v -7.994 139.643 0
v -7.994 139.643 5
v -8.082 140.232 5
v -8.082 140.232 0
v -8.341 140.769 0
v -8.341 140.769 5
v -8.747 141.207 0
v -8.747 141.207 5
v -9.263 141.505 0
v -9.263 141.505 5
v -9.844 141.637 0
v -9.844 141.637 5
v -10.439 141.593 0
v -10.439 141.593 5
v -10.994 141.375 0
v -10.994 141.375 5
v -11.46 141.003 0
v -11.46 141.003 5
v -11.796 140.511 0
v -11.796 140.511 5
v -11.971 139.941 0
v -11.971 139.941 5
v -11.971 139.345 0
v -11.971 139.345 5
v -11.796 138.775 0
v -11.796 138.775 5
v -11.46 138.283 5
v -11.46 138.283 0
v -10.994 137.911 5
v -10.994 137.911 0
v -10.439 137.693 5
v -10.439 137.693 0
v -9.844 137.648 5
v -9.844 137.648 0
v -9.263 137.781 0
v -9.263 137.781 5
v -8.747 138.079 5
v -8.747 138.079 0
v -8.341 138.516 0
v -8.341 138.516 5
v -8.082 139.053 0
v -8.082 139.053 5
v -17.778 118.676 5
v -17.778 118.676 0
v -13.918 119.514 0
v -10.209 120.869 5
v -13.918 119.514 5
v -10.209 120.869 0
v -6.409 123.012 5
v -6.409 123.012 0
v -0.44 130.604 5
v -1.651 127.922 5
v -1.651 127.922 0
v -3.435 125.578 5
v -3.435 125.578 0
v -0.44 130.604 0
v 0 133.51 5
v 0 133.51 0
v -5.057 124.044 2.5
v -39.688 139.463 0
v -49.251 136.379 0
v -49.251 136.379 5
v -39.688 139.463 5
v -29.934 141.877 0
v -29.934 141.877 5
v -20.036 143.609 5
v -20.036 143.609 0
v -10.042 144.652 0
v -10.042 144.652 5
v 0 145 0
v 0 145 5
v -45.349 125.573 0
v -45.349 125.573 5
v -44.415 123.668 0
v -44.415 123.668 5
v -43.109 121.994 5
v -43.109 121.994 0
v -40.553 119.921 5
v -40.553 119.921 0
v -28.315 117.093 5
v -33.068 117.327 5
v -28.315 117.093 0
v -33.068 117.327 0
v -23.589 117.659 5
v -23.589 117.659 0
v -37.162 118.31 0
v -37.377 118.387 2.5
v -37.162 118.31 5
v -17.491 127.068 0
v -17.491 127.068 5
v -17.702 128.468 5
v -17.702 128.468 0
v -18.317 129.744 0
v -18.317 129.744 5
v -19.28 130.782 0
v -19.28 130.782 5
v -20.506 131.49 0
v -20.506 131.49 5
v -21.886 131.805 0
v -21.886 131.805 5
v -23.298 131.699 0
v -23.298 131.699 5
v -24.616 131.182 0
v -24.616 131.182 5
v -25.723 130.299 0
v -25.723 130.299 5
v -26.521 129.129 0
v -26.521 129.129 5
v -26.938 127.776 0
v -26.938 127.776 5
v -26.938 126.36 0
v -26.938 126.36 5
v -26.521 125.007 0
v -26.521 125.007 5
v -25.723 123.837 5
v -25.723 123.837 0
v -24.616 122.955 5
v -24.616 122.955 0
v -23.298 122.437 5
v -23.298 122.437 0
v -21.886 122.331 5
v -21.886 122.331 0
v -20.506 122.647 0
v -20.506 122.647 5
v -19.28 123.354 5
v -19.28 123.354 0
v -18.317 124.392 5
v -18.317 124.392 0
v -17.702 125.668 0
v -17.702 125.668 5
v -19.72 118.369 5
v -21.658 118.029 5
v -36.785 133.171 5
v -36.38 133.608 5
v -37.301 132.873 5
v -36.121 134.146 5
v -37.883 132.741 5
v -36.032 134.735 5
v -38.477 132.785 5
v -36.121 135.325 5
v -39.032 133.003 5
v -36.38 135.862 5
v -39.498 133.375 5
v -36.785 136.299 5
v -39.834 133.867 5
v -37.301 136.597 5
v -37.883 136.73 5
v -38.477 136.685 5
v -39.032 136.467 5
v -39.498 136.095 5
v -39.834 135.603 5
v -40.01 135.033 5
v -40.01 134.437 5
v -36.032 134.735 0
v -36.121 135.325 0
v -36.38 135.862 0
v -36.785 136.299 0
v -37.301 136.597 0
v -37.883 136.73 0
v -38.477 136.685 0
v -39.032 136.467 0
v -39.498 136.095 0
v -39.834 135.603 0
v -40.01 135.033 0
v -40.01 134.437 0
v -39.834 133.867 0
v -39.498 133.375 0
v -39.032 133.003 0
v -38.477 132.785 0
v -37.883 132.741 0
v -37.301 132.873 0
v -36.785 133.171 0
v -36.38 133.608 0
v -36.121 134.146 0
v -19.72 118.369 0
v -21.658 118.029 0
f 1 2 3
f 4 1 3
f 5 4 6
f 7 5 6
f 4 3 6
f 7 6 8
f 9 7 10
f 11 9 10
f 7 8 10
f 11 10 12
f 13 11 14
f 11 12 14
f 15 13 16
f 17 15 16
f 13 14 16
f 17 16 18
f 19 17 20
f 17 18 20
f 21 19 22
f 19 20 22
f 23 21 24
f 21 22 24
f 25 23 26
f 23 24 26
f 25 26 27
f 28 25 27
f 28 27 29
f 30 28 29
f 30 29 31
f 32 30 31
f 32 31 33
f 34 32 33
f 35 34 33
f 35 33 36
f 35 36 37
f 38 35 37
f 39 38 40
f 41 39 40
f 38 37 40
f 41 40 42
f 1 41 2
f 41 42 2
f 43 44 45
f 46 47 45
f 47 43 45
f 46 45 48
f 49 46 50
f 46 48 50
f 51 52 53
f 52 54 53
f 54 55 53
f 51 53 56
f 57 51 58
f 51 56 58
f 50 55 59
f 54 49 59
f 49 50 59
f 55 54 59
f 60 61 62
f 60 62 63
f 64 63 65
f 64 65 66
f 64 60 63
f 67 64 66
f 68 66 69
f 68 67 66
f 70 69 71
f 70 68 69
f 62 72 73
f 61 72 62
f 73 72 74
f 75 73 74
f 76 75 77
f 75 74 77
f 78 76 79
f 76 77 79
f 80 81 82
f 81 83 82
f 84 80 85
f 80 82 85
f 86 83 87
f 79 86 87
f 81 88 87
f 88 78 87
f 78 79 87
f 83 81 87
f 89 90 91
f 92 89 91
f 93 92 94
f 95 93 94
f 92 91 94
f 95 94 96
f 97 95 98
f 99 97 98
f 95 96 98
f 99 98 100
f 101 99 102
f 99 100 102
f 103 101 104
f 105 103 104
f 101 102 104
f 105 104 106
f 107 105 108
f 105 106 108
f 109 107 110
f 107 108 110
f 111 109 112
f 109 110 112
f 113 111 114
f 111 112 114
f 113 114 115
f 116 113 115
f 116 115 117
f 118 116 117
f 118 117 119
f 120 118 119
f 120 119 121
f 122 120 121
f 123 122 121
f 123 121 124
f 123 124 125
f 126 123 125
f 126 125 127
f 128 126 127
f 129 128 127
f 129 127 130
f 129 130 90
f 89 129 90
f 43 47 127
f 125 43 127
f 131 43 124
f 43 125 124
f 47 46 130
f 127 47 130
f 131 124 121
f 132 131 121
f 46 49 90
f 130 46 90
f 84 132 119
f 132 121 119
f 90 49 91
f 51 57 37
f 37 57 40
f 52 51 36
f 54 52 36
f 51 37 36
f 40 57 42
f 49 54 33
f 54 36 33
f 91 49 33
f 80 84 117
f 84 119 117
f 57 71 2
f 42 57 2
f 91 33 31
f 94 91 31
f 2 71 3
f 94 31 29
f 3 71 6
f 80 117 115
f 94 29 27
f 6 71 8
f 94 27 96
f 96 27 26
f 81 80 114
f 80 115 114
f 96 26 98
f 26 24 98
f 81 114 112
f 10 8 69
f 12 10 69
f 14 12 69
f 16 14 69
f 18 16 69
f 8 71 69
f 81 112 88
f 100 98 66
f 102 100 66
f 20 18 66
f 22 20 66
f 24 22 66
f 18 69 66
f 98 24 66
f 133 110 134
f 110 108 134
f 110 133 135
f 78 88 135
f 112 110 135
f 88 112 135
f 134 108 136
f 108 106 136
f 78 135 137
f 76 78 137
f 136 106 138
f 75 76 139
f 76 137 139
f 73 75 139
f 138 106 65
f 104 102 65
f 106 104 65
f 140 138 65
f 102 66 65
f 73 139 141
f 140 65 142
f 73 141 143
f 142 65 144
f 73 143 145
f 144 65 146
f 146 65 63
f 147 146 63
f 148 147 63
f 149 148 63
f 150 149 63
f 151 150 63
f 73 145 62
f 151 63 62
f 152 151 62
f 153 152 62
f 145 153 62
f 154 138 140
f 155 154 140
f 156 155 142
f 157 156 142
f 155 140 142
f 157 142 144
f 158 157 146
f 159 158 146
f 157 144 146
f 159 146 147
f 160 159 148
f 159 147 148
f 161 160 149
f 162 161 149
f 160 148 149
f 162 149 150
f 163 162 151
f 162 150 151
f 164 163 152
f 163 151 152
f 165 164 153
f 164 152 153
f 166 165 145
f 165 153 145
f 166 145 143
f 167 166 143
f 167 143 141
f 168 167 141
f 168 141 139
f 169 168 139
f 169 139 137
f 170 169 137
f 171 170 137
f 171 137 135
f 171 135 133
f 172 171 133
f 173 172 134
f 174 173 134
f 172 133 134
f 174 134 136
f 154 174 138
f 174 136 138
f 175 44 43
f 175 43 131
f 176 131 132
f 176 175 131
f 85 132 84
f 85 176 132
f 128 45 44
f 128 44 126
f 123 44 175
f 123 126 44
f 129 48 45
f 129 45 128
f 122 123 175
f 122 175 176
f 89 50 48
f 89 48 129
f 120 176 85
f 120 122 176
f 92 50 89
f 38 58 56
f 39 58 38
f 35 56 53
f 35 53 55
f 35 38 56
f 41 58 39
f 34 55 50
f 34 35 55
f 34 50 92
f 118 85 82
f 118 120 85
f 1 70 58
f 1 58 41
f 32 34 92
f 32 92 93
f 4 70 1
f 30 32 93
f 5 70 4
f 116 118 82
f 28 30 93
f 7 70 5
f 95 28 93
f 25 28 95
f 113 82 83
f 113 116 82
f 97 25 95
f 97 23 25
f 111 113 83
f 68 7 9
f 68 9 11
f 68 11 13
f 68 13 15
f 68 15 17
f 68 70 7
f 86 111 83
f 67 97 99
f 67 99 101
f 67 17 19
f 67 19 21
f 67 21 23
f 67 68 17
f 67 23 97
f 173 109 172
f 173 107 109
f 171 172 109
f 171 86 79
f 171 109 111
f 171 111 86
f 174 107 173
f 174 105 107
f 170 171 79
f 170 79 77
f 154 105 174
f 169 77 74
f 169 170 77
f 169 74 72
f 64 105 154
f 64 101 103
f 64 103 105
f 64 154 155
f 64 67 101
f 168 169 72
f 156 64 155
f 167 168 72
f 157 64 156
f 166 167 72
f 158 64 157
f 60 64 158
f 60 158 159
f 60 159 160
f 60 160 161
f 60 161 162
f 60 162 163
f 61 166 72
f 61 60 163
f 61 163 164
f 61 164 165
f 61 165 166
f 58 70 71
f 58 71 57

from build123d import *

# Parameters (mm, degrees)
ESTRUSIONE_ESTRUSIONE1_DEPTH = 5
SCHIZZO2_R                   = 2
TAGLIO_ESTRUSIONE1_DEPTH     = 5
SCHIZZO4_R                   = 4.75
TAGLIO_ESTRUSIONE2_DEPTH     = 10


with BuildPart() as part:
    # Schizzo1 → Estrusione-Estrusione1 (new body)
    with BuildSketch(Plane.XY):
        with BuildLine():
            Line((0, 145), (0, 120))
            ThreePointArc((0, 120), (-20.689655172, 118.2029533), (-40.759639069, 112.865636147))
            Line((-40.759639069, 112.865636147), (-49.251230542, 136.379310345))
            ThreePointArc((-49.251230542, 136.379310345), (-25, 142.828568571), (0, 145))
        make_face()
    extrude(amount=ESTRUSIONE_ESTRUSIONE1_DEPTH)

    # Schizzo2 → Taglio-Estrusione1 (cut)
    with BuildSketch(Plane.XY.offset(5)):
        with Locations((-38.032134419, 134.73513555)):
            Circle(SCHIZZO2_R)
        with Locations((-9.993620414, 139.642857143)):
            Circle(SCHIZZO2_R)
    extrude(amount=-TAGLIO_ESTRUSIONE1_DEPTH, mode=Mode.SUBTRACT)

    # Raccordo1
    # an asymmetric fillet: 20, 15 mm, written as the material it takes off along each edge
    with BuildSketch(Plane(origin=(-40.759639069, 112.865636147, -44.567563269), x_dir=(-0.3396636589081028, 0.9405469678953624, 0), z_dir=(0, 0, 1))) as raccordo1_piece_1:
        with BuildLine():
            Bezier((13.510299228, 0), (1.338953576, 0), (-1.324178464, -17.777777778), weights=[1, 0.757676761, 1])
            ThreePointArc((-1.324178464, -17.777777778), (-0.331502507, -8.913512654), (0, 0))
            Line((0, 0), (13.510299228, 0))
        make_face()
    extrude(amount=94.135126538, mode=Mode.SUBTRACT)

    # Raccordo2
    # an asymmetric fillet: 20, 15 mm, written as the material it takes off along each edge
    with BuildSketch(Plane(origin=(0, 120, -44.567563269), x_dir=(-0.9972374791061684, -0.07427927211527091, 0), z_dir=(0, 0, 1))) as raccordo2_piece_1:
        with BuildLine():
            Bezier((17.827025308, 0), (-0.099456497, -1.335254689), (-1.003535193, -13.472976744), weights=[1, 0.757676761, 1])
            Line((-1.003535193, -13.472976744), (0, 0))
            ThreePointArc((0, 0), (8.913512654, -0.331502507), (17.827025308, 0))
        make_face()
    extrude(amount=94.135126538, mode=Mode.SUBTRACT)

    # Schizzo4 → Taglio-Estrusione2 (cut)
    with BuildSketch(Plane.XY.offset(5)):
        with Locations((-22.24137931, 127.068174798)):
            Circle(SCHIZZO4_R)
    extrude(amount=-TAGLIO_ESTRUSIONE2_DEPTH, mode=Mode.SUBTRACT)


solid = part.part
